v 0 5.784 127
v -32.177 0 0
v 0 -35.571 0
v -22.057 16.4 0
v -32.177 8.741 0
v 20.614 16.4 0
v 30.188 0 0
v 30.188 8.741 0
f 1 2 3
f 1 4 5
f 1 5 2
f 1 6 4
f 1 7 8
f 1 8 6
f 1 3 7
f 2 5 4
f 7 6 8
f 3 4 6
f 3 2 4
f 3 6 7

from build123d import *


with BuildPart() as f3:
    # F0 (on Top) → F3 section 0
    with BuildSketch(Plane.XY, mode=Mode.PRIVATE) as f3_s0:
        Polygon((-32.177303, 8.740868), (-32.177303, 0), (0, -35.571251), (30.187905, 0), (30.187905, 8.740868), (20.614294, 16.399754), (-22.056634, 16.399754), align=None)
    loft([f3_s0.sketch, Vertex(0, 5.783991, 127)])


solid = f3.part
